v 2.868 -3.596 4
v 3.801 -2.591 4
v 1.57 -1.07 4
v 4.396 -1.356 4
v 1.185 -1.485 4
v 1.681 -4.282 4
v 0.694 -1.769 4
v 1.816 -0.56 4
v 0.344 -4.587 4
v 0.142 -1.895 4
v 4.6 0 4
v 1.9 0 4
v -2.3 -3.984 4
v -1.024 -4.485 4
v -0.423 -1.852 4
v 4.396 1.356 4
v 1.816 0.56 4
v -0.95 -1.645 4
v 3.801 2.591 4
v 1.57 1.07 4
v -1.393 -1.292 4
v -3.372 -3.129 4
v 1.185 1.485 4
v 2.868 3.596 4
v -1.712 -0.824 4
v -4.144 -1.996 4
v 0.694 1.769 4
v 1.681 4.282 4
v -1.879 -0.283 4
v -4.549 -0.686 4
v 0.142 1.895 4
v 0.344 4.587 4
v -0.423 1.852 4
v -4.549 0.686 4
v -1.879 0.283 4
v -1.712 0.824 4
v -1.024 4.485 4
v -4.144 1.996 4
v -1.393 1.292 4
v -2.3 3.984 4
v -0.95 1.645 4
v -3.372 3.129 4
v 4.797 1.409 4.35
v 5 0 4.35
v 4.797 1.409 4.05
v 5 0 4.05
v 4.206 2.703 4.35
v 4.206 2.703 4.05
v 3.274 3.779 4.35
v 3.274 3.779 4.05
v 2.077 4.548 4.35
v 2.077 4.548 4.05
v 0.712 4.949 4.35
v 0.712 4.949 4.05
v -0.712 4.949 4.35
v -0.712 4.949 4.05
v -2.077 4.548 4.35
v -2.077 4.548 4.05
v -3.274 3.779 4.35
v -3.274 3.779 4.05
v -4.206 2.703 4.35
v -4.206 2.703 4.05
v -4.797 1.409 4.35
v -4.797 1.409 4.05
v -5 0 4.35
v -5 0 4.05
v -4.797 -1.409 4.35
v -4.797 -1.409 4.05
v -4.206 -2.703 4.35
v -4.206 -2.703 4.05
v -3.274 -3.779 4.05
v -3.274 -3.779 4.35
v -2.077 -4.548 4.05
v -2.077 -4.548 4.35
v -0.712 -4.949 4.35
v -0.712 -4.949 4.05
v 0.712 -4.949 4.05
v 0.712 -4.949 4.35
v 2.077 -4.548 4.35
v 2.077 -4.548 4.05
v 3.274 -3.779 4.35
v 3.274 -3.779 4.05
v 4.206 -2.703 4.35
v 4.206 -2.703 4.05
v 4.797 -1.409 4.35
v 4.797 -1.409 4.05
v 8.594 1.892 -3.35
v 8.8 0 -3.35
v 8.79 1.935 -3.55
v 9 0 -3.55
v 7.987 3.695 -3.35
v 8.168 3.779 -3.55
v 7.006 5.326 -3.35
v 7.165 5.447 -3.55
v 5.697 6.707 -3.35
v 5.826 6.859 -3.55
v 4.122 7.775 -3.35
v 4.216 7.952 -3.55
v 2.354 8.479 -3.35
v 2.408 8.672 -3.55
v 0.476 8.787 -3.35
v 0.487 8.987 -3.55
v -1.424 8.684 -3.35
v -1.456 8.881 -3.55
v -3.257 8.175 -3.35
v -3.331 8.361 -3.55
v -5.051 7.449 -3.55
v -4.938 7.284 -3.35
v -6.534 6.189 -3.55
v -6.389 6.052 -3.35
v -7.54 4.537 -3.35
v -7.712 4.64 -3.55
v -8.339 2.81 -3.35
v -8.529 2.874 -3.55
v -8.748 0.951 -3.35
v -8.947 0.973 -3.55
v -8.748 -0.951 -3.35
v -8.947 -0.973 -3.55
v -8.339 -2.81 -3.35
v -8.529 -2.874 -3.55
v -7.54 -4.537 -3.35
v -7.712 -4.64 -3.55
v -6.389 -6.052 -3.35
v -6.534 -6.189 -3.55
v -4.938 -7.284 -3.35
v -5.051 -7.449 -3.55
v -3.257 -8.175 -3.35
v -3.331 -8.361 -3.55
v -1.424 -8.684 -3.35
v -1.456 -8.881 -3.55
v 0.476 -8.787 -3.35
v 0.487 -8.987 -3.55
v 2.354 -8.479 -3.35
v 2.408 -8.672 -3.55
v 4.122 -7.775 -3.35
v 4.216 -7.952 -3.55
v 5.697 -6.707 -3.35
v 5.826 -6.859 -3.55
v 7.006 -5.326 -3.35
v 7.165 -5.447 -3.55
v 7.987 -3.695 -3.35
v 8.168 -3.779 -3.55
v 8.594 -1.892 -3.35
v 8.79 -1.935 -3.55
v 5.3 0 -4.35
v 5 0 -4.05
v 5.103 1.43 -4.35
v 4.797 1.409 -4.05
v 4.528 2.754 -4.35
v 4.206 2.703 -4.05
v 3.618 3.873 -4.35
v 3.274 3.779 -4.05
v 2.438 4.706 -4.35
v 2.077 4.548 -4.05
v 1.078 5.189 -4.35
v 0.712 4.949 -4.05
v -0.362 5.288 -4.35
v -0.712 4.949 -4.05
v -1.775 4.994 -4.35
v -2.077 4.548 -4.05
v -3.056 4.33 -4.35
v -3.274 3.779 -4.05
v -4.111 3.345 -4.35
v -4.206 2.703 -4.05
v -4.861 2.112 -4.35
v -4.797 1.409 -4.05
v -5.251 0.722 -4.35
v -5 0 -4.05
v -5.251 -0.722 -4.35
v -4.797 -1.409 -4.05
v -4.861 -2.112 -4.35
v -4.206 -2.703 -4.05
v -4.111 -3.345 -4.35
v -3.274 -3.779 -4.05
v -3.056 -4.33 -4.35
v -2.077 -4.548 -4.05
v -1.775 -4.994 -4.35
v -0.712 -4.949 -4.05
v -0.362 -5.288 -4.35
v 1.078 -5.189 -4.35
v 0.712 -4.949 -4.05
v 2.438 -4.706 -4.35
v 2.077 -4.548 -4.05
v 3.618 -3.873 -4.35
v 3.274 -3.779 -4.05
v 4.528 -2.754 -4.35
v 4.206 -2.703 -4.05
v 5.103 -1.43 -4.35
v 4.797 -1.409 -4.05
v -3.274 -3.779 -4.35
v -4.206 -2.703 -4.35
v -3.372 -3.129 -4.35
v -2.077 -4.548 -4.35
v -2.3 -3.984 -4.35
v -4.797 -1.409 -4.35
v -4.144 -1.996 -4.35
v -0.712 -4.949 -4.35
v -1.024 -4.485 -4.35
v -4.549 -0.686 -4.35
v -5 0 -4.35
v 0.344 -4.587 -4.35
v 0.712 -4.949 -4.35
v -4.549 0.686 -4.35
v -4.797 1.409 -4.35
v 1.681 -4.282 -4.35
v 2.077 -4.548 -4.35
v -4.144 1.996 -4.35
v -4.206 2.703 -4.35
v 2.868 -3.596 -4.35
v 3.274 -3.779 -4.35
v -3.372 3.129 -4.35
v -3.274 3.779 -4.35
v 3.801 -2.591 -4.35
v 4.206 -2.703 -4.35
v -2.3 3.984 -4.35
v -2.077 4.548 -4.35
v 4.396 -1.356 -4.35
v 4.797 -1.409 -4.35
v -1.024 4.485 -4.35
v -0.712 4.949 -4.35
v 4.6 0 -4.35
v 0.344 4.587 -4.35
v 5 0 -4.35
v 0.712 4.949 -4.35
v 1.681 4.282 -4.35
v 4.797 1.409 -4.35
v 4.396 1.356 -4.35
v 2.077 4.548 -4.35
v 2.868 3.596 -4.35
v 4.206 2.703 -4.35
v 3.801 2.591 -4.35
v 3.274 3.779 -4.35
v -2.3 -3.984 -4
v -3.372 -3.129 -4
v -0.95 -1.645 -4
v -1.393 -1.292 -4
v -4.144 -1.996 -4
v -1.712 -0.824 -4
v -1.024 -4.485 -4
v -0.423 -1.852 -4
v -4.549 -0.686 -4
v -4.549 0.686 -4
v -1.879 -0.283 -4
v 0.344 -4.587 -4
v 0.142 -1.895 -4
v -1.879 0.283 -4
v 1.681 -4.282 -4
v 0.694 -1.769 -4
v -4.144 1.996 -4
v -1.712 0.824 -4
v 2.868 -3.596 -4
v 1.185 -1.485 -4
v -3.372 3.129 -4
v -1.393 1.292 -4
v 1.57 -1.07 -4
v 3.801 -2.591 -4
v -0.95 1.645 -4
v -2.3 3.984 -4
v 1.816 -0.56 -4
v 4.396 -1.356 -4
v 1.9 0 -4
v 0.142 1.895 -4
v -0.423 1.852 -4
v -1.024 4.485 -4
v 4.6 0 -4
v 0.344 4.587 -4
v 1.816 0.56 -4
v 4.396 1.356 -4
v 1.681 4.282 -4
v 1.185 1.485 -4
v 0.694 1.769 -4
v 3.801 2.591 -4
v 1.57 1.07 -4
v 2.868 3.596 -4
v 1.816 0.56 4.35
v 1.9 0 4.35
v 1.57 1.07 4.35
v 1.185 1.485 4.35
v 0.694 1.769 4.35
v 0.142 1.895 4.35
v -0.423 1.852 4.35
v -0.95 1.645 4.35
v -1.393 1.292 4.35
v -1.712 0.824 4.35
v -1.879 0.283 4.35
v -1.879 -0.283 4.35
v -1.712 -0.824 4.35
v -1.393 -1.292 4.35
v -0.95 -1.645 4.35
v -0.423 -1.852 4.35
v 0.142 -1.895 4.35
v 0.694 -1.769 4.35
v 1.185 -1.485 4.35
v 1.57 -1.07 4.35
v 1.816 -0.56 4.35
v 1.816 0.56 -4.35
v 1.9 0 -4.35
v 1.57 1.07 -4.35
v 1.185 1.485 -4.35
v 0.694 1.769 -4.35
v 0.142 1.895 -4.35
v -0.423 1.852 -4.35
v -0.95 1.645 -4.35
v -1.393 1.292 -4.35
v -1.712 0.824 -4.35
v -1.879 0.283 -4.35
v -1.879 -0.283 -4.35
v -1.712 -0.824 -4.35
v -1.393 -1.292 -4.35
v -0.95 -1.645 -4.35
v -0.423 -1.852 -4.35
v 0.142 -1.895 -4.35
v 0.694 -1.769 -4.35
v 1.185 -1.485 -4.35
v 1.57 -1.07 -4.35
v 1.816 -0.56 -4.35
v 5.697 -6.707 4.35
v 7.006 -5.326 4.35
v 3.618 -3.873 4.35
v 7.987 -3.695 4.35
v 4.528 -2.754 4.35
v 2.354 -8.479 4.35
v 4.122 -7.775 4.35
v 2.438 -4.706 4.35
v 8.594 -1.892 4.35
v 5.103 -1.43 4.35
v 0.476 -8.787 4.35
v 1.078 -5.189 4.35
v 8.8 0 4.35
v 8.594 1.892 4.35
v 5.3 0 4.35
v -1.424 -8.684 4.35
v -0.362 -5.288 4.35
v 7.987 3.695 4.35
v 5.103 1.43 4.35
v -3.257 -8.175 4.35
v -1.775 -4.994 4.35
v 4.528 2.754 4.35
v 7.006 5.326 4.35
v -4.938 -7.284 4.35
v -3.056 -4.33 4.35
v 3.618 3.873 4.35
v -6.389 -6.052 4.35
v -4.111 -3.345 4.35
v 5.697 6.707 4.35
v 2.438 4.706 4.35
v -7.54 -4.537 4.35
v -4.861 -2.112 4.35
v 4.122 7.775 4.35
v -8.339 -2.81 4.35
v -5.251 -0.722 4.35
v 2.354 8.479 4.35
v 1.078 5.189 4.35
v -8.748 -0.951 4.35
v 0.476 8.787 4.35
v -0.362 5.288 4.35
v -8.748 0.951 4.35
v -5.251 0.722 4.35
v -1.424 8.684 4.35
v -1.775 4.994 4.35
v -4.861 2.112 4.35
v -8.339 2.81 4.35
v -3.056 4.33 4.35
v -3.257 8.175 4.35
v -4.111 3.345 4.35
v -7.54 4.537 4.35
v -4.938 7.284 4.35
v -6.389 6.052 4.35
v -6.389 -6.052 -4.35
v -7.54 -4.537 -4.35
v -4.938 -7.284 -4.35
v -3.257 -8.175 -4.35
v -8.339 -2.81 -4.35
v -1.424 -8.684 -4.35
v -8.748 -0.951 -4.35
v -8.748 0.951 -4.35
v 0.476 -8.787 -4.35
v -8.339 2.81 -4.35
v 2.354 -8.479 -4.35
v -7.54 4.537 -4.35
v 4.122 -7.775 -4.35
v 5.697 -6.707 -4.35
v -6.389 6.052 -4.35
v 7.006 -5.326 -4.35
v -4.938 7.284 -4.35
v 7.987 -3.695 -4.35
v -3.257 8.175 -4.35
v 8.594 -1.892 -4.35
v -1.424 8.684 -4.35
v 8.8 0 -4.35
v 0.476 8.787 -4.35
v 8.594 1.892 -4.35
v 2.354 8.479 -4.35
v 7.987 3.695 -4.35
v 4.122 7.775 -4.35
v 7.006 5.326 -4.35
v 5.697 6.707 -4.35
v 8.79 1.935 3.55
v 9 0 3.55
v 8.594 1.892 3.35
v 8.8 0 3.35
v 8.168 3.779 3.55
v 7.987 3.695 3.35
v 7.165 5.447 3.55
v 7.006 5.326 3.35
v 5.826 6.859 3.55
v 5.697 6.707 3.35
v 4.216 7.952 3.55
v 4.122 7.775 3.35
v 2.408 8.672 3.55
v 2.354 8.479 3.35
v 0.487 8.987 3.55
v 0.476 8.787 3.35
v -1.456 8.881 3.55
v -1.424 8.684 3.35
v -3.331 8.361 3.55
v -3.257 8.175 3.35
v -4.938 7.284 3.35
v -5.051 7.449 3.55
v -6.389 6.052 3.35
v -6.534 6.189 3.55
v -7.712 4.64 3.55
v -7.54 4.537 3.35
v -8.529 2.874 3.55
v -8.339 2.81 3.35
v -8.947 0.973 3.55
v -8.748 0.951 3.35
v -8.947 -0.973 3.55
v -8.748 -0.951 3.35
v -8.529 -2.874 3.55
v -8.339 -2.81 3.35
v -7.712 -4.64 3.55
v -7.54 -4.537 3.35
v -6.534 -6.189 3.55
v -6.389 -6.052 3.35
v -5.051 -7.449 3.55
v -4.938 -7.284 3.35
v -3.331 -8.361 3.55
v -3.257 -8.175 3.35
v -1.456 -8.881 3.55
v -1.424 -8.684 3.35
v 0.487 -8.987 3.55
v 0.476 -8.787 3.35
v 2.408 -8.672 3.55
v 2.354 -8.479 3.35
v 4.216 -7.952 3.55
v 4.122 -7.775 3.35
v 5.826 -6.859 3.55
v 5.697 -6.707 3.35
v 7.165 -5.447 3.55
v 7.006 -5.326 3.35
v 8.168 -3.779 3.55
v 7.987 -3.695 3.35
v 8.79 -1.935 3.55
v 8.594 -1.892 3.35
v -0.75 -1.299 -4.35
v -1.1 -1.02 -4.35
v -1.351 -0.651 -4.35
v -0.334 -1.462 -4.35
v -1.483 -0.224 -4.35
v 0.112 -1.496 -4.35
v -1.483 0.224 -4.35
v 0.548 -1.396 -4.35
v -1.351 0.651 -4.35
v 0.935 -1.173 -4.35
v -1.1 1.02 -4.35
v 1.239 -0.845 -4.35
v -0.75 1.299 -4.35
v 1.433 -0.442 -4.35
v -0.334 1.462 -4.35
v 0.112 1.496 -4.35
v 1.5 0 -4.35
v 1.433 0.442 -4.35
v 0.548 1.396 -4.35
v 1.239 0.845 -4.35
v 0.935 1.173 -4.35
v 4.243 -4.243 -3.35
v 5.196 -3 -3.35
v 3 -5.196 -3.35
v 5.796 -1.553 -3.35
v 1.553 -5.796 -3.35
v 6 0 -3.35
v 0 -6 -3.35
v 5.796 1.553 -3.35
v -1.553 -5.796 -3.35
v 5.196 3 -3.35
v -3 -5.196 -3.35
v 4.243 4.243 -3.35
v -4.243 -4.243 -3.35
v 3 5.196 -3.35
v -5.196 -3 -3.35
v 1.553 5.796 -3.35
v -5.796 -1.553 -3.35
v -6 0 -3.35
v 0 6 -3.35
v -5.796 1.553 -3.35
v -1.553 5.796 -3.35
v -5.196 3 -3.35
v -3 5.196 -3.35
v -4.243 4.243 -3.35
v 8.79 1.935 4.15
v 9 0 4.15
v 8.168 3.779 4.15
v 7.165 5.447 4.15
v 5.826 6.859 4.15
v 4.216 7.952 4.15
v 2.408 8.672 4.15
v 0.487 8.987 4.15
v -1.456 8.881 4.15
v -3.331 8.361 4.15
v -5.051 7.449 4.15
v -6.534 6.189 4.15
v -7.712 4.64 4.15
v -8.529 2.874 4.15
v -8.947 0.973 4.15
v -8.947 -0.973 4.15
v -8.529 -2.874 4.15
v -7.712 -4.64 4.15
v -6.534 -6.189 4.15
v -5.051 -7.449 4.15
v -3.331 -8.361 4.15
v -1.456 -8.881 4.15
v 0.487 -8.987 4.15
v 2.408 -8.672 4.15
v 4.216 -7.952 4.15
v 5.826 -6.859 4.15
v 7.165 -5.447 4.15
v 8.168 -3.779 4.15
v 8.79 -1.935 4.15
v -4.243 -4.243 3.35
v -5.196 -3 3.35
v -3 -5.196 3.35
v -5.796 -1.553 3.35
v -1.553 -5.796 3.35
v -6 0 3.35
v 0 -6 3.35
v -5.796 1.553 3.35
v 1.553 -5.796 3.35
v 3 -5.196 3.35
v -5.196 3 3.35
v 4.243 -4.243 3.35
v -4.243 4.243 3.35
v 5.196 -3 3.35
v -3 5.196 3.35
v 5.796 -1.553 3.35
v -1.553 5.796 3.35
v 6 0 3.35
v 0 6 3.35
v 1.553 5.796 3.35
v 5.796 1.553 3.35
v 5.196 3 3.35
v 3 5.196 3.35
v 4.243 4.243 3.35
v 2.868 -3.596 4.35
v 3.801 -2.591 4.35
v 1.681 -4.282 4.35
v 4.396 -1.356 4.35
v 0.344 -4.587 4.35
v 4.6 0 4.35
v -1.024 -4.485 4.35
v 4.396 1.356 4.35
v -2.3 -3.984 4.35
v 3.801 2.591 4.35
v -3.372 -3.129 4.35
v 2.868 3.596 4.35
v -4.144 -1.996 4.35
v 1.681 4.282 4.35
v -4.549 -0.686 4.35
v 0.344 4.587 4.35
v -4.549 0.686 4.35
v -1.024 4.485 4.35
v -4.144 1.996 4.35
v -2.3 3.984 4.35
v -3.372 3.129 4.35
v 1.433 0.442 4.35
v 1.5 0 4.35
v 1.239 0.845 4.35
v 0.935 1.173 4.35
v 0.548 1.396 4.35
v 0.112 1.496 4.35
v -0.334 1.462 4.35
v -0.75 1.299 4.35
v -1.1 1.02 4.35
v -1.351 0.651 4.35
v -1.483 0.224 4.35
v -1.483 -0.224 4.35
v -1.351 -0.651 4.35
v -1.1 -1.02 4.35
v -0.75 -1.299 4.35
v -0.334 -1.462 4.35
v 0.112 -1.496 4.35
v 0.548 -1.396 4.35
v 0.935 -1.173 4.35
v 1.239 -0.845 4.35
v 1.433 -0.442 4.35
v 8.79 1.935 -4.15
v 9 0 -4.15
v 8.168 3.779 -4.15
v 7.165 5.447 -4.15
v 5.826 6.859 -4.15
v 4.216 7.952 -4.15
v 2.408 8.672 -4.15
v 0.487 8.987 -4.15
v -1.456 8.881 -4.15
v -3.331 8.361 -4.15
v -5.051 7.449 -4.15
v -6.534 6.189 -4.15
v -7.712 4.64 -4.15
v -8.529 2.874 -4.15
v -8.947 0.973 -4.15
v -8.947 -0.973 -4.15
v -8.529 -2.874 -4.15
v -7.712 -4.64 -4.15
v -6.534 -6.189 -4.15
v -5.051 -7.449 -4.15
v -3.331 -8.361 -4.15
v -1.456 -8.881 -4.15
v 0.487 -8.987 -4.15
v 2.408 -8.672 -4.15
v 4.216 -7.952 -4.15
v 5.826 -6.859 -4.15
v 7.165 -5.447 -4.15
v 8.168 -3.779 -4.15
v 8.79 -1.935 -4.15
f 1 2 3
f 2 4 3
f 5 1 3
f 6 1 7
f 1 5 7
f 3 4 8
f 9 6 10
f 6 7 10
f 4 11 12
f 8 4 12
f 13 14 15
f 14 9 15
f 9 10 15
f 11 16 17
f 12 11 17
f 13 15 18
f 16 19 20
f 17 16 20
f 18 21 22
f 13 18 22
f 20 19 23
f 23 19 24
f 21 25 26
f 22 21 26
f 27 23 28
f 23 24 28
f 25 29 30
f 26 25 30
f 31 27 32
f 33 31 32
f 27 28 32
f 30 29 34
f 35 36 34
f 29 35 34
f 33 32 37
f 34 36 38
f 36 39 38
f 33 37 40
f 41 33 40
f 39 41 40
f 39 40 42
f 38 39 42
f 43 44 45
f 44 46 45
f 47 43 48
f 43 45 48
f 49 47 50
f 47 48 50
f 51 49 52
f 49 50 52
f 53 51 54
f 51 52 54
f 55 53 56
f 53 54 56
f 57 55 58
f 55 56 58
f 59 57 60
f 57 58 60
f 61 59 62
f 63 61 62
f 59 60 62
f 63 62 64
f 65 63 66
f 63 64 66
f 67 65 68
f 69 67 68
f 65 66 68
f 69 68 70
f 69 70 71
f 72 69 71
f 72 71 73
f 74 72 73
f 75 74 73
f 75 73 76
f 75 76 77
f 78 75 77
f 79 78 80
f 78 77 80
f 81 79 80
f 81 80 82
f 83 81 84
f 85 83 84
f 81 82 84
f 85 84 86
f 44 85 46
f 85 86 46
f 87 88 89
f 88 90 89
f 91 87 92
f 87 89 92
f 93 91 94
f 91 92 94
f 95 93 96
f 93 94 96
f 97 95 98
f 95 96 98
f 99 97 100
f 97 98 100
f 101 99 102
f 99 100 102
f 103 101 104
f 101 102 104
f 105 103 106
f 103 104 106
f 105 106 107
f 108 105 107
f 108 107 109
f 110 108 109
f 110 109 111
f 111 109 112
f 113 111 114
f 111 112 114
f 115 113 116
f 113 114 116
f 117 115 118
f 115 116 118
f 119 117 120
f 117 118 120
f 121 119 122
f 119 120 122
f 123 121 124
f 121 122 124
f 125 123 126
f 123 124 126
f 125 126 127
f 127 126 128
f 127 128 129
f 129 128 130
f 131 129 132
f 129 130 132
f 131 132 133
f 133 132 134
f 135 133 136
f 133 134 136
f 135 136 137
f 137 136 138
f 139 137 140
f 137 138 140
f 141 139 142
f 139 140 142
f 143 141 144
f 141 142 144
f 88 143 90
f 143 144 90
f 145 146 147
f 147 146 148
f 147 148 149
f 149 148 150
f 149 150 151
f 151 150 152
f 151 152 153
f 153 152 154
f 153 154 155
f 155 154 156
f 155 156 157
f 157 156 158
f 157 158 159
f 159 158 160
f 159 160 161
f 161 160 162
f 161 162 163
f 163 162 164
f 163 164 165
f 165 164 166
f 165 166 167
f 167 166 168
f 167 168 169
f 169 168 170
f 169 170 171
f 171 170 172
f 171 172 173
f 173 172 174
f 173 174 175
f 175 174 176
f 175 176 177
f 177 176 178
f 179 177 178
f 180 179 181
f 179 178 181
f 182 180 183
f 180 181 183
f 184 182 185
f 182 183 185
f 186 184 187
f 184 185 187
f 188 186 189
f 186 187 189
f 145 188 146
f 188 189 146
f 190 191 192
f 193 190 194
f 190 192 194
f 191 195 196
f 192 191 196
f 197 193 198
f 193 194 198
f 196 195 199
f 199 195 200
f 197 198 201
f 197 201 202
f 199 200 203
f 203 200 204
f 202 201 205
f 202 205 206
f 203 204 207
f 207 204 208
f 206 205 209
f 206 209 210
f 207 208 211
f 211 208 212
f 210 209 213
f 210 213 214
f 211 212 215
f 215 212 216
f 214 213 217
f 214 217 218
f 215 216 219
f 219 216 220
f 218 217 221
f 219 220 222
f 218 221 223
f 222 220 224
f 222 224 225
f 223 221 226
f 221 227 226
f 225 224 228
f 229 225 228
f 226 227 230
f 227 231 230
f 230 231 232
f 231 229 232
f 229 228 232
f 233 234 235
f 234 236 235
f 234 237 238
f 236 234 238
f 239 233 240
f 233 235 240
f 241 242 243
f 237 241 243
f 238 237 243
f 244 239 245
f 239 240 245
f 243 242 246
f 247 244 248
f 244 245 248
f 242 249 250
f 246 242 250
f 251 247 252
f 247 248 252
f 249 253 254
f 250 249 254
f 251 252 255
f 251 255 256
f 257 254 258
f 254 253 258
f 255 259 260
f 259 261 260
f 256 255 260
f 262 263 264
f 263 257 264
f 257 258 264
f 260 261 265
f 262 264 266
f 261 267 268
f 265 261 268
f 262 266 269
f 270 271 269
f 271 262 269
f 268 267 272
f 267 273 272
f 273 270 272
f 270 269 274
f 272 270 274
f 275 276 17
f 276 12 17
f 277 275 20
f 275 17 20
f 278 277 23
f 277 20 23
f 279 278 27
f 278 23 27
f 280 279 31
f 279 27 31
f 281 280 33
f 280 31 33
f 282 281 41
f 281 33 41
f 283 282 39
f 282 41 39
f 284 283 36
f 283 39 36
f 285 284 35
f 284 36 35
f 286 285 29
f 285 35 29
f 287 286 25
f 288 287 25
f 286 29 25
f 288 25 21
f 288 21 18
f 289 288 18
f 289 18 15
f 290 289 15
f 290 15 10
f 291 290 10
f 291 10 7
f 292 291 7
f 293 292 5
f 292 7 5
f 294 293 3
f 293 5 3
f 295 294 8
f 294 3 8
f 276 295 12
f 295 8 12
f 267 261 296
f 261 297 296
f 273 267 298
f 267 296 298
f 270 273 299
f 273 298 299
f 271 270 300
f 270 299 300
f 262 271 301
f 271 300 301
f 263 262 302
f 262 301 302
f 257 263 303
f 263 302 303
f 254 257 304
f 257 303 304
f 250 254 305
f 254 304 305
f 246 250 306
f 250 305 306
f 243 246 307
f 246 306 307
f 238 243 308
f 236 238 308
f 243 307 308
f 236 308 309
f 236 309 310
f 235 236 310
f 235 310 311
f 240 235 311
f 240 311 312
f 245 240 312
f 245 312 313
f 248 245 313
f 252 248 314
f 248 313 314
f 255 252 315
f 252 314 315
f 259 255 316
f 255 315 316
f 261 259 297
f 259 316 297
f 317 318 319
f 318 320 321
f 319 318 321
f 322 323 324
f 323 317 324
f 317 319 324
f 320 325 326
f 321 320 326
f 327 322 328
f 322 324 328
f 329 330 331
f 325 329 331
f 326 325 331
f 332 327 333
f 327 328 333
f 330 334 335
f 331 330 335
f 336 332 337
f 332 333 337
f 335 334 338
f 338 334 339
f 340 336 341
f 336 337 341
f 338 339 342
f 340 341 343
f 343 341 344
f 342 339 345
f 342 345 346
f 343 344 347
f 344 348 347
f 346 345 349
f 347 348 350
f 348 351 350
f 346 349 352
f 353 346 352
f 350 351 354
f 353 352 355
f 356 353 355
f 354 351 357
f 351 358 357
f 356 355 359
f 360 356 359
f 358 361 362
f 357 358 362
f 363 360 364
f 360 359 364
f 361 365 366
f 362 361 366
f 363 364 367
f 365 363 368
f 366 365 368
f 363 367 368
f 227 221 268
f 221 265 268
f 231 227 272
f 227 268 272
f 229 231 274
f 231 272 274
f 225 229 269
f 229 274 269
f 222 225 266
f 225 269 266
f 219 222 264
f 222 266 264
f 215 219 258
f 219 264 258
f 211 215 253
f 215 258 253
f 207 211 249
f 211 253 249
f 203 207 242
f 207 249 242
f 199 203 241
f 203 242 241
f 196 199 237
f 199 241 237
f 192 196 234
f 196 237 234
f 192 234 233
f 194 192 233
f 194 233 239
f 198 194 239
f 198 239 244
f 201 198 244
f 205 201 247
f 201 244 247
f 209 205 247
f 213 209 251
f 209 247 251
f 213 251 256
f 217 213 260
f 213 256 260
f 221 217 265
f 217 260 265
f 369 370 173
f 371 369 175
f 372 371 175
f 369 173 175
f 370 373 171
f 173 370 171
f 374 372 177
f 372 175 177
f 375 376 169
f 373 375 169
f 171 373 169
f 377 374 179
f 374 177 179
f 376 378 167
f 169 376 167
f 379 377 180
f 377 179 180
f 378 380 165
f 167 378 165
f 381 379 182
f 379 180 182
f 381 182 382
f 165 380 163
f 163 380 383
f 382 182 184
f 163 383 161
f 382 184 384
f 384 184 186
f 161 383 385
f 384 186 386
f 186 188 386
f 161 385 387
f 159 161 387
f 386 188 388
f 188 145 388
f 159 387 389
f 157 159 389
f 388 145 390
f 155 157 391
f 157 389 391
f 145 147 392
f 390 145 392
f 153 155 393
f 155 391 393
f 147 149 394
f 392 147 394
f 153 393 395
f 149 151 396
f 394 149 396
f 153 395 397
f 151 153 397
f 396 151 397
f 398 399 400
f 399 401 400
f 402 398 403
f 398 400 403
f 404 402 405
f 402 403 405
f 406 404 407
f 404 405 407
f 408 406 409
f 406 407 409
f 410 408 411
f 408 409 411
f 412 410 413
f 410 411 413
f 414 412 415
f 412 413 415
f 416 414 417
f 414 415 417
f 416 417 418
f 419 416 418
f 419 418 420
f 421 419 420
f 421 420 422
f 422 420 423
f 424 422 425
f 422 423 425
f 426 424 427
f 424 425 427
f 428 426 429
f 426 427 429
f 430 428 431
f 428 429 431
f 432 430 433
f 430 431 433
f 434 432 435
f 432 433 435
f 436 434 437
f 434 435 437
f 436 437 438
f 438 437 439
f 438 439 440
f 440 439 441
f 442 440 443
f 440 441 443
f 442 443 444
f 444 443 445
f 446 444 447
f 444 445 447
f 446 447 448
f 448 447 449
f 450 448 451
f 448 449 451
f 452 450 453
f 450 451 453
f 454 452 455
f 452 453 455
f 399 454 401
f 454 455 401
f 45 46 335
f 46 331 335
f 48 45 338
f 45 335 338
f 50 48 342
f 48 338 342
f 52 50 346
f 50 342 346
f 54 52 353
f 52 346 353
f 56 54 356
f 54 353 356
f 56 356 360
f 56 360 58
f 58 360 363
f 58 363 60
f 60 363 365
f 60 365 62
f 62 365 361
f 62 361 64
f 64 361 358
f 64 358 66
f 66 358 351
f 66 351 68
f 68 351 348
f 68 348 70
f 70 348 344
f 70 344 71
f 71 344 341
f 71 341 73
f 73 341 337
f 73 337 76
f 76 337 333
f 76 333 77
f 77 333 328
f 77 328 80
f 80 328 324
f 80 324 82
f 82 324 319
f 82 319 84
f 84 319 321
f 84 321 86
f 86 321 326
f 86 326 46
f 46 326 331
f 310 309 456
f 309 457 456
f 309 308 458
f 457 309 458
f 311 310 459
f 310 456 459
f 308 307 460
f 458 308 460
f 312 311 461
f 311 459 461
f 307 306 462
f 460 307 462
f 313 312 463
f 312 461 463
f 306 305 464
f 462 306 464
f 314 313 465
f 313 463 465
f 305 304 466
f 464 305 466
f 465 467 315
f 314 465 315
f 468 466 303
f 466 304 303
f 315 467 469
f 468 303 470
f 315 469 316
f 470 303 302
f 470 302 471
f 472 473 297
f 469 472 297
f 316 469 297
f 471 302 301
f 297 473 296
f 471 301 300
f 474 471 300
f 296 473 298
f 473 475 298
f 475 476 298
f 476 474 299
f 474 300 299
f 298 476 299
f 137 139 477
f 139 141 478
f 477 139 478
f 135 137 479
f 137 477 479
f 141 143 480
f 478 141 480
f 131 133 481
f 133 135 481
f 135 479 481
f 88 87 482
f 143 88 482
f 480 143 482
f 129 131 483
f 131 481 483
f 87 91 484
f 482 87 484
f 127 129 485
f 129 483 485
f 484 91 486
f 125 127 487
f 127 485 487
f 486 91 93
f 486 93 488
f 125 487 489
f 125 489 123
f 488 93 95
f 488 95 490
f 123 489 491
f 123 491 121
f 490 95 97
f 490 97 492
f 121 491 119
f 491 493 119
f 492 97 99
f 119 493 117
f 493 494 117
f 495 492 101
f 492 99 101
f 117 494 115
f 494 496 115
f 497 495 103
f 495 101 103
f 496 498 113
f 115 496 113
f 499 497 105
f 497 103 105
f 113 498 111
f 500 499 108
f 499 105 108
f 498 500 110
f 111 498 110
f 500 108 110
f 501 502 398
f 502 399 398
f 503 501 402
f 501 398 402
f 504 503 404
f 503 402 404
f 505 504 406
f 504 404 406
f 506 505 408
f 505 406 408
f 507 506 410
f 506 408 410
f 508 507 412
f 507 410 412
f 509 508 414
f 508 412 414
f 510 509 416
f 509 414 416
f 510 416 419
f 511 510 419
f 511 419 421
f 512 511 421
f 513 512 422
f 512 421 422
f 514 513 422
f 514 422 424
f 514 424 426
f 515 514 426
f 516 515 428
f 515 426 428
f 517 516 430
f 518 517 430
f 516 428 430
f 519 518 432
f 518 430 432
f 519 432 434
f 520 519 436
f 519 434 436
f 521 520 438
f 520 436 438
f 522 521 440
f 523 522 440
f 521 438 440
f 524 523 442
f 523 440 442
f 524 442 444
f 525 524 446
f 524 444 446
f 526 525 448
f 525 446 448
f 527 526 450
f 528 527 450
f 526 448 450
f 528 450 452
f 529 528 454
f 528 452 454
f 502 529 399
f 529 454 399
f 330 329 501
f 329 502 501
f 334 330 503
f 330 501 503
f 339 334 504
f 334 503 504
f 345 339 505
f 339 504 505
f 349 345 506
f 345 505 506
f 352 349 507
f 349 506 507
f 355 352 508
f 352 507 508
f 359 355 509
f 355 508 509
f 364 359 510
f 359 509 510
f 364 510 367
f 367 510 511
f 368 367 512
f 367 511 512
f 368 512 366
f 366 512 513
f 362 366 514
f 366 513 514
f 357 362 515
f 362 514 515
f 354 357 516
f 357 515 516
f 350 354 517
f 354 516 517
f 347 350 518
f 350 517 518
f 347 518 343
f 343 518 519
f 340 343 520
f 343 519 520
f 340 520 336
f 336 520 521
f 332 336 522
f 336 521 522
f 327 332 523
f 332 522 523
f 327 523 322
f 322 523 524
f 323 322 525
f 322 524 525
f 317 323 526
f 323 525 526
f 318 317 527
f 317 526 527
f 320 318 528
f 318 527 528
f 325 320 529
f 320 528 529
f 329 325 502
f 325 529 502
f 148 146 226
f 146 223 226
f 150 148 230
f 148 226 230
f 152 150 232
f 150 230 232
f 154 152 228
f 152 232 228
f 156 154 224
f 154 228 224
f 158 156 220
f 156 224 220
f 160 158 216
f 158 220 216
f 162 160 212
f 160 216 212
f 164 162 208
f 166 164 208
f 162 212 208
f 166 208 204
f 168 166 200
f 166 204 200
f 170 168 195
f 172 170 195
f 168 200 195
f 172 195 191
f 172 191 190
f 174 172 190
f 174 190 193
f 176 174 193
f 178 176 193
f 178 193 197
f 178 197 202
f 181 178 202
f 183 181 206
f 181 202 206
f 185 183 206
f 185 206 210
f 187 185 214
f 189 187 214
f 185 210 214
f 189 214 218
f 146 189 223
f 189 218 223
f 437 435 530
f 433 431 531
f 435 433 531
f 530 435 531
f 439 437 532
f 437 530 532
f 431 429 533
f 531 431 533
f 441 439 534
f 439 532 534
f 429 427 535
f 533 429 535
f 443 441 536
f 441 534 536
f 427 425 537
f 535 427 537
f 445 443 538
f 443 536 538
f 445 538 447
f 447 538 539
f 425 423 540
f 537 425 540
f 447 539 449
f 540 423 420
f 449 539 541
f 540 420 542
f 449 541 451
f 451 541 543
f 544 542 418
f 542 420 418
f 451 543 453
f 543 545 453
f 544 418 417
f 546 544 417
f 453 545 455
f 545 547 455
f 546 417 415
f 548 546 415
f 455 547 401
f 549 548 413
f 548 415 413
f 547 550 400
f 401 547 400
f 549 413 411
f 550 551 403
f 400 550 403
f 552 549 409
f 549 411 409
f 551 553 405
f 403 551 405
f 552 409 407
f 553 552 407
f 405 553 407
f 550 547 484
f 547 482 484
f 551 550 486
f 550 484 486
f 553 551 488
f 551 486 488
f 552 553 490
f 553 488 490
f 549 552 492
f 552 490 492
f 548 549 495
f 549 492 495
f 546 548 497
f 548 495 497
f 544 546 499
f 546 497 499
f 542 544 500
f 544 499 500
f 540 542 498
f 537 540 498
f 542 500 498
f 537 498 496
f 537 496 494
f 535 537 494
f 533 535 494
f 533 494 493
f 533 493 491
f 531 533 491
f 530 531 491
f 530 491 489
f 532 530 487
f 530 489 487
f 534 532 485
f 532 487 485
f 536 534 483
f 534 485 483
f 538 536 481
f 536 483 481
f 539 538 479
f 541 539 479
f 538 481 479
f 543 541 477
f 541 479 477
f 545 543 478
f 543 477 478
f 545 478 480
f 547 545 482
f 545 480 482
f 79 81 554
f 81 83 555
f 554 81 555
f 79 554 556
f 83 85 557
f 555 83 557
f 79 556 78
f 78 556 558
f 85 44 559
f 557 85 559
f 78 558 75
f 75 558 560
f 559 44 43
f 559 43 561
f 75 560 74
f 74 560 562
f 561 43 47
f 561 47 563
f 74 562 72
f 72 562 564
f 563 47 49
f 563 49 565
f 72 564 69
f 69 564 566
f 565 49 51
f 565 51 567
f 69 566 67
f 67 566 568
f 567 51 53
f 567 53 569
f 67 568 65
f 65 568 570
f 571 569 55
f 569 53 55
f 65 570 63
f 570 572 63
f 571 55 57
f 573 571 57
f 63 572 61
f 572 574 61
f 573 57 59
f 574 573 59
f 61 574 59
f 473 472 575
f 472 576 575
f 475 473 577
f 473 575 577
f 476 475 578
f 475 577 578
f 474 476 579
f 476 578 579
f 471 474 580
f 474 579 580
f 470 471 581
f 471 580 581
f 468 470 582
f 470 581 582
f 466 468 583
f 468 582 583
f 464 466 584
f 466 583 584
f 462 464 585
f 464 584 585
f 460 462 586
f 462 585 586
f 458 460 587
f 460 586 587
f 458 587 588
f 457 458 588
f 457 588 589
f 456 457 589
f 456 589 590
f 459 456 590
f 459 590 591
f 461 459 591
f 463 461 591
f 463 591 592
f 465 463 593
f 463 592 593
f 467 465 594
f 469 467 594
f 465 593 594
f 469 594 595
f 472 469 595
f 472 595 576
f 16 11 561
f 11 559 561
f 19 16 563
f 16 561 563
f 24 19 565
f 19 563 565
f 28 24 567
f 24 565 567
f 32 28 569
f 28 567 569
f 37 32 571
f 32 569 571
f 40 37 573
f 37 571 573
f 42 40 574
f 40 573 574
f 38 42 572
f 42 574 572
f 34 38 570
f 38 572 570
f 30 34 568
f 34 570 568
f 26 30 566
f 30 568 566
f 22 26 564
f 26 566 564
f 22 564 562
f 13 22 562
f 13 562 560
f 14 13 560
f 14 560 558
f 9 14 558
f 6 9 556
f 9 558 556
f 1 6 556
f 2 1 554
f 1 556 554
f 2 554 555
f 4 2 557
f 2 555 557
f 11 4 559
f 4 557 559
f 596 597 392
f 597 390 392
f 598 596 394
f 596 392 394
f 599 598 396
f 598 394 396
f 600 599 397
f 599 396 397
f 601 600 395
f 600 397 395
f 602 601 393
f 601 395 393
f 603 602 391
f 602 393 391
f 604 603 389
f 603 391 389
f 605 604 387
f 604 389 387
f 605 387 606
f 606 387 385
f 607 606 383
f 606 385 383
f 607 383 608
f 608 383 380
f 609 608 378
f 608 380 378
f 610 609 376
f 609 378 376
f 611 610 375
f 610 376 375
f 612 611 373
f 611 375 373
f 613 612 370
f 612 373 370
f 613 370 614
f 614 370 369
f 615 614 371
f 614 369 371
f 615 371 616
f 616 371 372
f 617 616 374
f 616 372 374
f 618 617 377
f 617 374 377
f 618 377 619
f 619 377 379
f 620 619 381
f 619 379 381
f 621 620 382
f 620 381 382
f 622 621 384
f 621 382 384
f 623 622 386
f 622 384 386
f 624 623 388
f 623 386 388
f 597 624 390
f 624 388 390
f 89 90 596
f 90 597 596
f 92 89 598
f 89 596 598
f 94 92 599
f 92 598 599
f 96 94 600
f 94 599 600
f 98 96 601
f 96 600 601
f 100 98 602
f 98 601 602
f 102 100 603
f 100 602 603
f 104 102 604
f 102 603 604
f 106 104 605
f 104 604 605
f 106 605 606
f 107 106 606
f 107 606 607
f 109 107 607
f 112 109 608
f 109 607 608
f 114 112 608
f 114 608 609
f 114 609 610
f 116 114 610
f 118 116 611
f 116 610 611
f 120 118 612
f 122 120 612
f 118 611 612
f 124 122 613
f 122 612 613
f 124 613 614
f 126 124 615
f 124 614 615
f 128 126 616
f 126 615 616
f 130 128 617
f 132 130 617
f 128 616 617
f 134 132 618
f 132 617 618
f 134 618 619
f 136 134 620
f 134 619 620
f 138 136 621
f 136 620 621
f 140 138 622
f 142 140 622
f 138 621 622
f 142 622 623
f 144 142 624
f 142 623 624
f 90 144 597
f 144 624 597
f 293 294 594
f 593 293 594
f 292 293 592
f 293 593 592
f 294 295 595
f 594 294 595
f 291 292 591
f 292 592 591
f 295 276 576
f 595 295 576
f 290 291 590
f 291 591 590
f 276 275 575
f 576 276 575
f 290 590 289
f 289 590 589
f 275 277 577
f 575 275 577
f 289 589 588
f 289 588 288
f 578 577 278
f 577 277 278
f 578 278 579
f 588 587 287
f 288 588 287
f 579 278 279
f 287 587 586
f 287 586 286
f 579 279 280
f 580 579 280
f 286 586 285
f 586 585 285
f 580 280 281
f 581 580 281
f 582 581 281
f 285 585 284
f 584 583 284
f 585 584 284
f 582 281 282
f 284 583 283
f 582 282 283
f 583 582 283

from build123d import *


with BuildPart() as part:
    # Эскиз1 → Повернуть1 (revolve)
    with BuildSketch(Plane(origin=(0, 0, 0), x_dir=(1, 0, 0), z_dir=(0, 1, 0))):
        Polygon((4.6, 4.35), (4.6, 4), (1.9, 4), (1.9, 4.35), (1.5, 4.35), (1.5, -4.35), (1.9, -4.35), (1.9, -4), (4.6, -4), (4.6, -4.35), (5, -4.35), (5, -4.05), (5.3, -4.35), (8.8, -4.35), (9, -4.15), (9, -3.55), (8.8, -3.35), (6, -3.35), (6, 3.35), (8.8, 3.35), (9, 3.55), (9, 4.15), (8.8, 4.35), (5.3, 4.35), (5, 4.05), (5, 4.35), align=None)
    revolve(axis=Axis((0, 0, -4.35), (0, 0, 1)))


solid = part.part
